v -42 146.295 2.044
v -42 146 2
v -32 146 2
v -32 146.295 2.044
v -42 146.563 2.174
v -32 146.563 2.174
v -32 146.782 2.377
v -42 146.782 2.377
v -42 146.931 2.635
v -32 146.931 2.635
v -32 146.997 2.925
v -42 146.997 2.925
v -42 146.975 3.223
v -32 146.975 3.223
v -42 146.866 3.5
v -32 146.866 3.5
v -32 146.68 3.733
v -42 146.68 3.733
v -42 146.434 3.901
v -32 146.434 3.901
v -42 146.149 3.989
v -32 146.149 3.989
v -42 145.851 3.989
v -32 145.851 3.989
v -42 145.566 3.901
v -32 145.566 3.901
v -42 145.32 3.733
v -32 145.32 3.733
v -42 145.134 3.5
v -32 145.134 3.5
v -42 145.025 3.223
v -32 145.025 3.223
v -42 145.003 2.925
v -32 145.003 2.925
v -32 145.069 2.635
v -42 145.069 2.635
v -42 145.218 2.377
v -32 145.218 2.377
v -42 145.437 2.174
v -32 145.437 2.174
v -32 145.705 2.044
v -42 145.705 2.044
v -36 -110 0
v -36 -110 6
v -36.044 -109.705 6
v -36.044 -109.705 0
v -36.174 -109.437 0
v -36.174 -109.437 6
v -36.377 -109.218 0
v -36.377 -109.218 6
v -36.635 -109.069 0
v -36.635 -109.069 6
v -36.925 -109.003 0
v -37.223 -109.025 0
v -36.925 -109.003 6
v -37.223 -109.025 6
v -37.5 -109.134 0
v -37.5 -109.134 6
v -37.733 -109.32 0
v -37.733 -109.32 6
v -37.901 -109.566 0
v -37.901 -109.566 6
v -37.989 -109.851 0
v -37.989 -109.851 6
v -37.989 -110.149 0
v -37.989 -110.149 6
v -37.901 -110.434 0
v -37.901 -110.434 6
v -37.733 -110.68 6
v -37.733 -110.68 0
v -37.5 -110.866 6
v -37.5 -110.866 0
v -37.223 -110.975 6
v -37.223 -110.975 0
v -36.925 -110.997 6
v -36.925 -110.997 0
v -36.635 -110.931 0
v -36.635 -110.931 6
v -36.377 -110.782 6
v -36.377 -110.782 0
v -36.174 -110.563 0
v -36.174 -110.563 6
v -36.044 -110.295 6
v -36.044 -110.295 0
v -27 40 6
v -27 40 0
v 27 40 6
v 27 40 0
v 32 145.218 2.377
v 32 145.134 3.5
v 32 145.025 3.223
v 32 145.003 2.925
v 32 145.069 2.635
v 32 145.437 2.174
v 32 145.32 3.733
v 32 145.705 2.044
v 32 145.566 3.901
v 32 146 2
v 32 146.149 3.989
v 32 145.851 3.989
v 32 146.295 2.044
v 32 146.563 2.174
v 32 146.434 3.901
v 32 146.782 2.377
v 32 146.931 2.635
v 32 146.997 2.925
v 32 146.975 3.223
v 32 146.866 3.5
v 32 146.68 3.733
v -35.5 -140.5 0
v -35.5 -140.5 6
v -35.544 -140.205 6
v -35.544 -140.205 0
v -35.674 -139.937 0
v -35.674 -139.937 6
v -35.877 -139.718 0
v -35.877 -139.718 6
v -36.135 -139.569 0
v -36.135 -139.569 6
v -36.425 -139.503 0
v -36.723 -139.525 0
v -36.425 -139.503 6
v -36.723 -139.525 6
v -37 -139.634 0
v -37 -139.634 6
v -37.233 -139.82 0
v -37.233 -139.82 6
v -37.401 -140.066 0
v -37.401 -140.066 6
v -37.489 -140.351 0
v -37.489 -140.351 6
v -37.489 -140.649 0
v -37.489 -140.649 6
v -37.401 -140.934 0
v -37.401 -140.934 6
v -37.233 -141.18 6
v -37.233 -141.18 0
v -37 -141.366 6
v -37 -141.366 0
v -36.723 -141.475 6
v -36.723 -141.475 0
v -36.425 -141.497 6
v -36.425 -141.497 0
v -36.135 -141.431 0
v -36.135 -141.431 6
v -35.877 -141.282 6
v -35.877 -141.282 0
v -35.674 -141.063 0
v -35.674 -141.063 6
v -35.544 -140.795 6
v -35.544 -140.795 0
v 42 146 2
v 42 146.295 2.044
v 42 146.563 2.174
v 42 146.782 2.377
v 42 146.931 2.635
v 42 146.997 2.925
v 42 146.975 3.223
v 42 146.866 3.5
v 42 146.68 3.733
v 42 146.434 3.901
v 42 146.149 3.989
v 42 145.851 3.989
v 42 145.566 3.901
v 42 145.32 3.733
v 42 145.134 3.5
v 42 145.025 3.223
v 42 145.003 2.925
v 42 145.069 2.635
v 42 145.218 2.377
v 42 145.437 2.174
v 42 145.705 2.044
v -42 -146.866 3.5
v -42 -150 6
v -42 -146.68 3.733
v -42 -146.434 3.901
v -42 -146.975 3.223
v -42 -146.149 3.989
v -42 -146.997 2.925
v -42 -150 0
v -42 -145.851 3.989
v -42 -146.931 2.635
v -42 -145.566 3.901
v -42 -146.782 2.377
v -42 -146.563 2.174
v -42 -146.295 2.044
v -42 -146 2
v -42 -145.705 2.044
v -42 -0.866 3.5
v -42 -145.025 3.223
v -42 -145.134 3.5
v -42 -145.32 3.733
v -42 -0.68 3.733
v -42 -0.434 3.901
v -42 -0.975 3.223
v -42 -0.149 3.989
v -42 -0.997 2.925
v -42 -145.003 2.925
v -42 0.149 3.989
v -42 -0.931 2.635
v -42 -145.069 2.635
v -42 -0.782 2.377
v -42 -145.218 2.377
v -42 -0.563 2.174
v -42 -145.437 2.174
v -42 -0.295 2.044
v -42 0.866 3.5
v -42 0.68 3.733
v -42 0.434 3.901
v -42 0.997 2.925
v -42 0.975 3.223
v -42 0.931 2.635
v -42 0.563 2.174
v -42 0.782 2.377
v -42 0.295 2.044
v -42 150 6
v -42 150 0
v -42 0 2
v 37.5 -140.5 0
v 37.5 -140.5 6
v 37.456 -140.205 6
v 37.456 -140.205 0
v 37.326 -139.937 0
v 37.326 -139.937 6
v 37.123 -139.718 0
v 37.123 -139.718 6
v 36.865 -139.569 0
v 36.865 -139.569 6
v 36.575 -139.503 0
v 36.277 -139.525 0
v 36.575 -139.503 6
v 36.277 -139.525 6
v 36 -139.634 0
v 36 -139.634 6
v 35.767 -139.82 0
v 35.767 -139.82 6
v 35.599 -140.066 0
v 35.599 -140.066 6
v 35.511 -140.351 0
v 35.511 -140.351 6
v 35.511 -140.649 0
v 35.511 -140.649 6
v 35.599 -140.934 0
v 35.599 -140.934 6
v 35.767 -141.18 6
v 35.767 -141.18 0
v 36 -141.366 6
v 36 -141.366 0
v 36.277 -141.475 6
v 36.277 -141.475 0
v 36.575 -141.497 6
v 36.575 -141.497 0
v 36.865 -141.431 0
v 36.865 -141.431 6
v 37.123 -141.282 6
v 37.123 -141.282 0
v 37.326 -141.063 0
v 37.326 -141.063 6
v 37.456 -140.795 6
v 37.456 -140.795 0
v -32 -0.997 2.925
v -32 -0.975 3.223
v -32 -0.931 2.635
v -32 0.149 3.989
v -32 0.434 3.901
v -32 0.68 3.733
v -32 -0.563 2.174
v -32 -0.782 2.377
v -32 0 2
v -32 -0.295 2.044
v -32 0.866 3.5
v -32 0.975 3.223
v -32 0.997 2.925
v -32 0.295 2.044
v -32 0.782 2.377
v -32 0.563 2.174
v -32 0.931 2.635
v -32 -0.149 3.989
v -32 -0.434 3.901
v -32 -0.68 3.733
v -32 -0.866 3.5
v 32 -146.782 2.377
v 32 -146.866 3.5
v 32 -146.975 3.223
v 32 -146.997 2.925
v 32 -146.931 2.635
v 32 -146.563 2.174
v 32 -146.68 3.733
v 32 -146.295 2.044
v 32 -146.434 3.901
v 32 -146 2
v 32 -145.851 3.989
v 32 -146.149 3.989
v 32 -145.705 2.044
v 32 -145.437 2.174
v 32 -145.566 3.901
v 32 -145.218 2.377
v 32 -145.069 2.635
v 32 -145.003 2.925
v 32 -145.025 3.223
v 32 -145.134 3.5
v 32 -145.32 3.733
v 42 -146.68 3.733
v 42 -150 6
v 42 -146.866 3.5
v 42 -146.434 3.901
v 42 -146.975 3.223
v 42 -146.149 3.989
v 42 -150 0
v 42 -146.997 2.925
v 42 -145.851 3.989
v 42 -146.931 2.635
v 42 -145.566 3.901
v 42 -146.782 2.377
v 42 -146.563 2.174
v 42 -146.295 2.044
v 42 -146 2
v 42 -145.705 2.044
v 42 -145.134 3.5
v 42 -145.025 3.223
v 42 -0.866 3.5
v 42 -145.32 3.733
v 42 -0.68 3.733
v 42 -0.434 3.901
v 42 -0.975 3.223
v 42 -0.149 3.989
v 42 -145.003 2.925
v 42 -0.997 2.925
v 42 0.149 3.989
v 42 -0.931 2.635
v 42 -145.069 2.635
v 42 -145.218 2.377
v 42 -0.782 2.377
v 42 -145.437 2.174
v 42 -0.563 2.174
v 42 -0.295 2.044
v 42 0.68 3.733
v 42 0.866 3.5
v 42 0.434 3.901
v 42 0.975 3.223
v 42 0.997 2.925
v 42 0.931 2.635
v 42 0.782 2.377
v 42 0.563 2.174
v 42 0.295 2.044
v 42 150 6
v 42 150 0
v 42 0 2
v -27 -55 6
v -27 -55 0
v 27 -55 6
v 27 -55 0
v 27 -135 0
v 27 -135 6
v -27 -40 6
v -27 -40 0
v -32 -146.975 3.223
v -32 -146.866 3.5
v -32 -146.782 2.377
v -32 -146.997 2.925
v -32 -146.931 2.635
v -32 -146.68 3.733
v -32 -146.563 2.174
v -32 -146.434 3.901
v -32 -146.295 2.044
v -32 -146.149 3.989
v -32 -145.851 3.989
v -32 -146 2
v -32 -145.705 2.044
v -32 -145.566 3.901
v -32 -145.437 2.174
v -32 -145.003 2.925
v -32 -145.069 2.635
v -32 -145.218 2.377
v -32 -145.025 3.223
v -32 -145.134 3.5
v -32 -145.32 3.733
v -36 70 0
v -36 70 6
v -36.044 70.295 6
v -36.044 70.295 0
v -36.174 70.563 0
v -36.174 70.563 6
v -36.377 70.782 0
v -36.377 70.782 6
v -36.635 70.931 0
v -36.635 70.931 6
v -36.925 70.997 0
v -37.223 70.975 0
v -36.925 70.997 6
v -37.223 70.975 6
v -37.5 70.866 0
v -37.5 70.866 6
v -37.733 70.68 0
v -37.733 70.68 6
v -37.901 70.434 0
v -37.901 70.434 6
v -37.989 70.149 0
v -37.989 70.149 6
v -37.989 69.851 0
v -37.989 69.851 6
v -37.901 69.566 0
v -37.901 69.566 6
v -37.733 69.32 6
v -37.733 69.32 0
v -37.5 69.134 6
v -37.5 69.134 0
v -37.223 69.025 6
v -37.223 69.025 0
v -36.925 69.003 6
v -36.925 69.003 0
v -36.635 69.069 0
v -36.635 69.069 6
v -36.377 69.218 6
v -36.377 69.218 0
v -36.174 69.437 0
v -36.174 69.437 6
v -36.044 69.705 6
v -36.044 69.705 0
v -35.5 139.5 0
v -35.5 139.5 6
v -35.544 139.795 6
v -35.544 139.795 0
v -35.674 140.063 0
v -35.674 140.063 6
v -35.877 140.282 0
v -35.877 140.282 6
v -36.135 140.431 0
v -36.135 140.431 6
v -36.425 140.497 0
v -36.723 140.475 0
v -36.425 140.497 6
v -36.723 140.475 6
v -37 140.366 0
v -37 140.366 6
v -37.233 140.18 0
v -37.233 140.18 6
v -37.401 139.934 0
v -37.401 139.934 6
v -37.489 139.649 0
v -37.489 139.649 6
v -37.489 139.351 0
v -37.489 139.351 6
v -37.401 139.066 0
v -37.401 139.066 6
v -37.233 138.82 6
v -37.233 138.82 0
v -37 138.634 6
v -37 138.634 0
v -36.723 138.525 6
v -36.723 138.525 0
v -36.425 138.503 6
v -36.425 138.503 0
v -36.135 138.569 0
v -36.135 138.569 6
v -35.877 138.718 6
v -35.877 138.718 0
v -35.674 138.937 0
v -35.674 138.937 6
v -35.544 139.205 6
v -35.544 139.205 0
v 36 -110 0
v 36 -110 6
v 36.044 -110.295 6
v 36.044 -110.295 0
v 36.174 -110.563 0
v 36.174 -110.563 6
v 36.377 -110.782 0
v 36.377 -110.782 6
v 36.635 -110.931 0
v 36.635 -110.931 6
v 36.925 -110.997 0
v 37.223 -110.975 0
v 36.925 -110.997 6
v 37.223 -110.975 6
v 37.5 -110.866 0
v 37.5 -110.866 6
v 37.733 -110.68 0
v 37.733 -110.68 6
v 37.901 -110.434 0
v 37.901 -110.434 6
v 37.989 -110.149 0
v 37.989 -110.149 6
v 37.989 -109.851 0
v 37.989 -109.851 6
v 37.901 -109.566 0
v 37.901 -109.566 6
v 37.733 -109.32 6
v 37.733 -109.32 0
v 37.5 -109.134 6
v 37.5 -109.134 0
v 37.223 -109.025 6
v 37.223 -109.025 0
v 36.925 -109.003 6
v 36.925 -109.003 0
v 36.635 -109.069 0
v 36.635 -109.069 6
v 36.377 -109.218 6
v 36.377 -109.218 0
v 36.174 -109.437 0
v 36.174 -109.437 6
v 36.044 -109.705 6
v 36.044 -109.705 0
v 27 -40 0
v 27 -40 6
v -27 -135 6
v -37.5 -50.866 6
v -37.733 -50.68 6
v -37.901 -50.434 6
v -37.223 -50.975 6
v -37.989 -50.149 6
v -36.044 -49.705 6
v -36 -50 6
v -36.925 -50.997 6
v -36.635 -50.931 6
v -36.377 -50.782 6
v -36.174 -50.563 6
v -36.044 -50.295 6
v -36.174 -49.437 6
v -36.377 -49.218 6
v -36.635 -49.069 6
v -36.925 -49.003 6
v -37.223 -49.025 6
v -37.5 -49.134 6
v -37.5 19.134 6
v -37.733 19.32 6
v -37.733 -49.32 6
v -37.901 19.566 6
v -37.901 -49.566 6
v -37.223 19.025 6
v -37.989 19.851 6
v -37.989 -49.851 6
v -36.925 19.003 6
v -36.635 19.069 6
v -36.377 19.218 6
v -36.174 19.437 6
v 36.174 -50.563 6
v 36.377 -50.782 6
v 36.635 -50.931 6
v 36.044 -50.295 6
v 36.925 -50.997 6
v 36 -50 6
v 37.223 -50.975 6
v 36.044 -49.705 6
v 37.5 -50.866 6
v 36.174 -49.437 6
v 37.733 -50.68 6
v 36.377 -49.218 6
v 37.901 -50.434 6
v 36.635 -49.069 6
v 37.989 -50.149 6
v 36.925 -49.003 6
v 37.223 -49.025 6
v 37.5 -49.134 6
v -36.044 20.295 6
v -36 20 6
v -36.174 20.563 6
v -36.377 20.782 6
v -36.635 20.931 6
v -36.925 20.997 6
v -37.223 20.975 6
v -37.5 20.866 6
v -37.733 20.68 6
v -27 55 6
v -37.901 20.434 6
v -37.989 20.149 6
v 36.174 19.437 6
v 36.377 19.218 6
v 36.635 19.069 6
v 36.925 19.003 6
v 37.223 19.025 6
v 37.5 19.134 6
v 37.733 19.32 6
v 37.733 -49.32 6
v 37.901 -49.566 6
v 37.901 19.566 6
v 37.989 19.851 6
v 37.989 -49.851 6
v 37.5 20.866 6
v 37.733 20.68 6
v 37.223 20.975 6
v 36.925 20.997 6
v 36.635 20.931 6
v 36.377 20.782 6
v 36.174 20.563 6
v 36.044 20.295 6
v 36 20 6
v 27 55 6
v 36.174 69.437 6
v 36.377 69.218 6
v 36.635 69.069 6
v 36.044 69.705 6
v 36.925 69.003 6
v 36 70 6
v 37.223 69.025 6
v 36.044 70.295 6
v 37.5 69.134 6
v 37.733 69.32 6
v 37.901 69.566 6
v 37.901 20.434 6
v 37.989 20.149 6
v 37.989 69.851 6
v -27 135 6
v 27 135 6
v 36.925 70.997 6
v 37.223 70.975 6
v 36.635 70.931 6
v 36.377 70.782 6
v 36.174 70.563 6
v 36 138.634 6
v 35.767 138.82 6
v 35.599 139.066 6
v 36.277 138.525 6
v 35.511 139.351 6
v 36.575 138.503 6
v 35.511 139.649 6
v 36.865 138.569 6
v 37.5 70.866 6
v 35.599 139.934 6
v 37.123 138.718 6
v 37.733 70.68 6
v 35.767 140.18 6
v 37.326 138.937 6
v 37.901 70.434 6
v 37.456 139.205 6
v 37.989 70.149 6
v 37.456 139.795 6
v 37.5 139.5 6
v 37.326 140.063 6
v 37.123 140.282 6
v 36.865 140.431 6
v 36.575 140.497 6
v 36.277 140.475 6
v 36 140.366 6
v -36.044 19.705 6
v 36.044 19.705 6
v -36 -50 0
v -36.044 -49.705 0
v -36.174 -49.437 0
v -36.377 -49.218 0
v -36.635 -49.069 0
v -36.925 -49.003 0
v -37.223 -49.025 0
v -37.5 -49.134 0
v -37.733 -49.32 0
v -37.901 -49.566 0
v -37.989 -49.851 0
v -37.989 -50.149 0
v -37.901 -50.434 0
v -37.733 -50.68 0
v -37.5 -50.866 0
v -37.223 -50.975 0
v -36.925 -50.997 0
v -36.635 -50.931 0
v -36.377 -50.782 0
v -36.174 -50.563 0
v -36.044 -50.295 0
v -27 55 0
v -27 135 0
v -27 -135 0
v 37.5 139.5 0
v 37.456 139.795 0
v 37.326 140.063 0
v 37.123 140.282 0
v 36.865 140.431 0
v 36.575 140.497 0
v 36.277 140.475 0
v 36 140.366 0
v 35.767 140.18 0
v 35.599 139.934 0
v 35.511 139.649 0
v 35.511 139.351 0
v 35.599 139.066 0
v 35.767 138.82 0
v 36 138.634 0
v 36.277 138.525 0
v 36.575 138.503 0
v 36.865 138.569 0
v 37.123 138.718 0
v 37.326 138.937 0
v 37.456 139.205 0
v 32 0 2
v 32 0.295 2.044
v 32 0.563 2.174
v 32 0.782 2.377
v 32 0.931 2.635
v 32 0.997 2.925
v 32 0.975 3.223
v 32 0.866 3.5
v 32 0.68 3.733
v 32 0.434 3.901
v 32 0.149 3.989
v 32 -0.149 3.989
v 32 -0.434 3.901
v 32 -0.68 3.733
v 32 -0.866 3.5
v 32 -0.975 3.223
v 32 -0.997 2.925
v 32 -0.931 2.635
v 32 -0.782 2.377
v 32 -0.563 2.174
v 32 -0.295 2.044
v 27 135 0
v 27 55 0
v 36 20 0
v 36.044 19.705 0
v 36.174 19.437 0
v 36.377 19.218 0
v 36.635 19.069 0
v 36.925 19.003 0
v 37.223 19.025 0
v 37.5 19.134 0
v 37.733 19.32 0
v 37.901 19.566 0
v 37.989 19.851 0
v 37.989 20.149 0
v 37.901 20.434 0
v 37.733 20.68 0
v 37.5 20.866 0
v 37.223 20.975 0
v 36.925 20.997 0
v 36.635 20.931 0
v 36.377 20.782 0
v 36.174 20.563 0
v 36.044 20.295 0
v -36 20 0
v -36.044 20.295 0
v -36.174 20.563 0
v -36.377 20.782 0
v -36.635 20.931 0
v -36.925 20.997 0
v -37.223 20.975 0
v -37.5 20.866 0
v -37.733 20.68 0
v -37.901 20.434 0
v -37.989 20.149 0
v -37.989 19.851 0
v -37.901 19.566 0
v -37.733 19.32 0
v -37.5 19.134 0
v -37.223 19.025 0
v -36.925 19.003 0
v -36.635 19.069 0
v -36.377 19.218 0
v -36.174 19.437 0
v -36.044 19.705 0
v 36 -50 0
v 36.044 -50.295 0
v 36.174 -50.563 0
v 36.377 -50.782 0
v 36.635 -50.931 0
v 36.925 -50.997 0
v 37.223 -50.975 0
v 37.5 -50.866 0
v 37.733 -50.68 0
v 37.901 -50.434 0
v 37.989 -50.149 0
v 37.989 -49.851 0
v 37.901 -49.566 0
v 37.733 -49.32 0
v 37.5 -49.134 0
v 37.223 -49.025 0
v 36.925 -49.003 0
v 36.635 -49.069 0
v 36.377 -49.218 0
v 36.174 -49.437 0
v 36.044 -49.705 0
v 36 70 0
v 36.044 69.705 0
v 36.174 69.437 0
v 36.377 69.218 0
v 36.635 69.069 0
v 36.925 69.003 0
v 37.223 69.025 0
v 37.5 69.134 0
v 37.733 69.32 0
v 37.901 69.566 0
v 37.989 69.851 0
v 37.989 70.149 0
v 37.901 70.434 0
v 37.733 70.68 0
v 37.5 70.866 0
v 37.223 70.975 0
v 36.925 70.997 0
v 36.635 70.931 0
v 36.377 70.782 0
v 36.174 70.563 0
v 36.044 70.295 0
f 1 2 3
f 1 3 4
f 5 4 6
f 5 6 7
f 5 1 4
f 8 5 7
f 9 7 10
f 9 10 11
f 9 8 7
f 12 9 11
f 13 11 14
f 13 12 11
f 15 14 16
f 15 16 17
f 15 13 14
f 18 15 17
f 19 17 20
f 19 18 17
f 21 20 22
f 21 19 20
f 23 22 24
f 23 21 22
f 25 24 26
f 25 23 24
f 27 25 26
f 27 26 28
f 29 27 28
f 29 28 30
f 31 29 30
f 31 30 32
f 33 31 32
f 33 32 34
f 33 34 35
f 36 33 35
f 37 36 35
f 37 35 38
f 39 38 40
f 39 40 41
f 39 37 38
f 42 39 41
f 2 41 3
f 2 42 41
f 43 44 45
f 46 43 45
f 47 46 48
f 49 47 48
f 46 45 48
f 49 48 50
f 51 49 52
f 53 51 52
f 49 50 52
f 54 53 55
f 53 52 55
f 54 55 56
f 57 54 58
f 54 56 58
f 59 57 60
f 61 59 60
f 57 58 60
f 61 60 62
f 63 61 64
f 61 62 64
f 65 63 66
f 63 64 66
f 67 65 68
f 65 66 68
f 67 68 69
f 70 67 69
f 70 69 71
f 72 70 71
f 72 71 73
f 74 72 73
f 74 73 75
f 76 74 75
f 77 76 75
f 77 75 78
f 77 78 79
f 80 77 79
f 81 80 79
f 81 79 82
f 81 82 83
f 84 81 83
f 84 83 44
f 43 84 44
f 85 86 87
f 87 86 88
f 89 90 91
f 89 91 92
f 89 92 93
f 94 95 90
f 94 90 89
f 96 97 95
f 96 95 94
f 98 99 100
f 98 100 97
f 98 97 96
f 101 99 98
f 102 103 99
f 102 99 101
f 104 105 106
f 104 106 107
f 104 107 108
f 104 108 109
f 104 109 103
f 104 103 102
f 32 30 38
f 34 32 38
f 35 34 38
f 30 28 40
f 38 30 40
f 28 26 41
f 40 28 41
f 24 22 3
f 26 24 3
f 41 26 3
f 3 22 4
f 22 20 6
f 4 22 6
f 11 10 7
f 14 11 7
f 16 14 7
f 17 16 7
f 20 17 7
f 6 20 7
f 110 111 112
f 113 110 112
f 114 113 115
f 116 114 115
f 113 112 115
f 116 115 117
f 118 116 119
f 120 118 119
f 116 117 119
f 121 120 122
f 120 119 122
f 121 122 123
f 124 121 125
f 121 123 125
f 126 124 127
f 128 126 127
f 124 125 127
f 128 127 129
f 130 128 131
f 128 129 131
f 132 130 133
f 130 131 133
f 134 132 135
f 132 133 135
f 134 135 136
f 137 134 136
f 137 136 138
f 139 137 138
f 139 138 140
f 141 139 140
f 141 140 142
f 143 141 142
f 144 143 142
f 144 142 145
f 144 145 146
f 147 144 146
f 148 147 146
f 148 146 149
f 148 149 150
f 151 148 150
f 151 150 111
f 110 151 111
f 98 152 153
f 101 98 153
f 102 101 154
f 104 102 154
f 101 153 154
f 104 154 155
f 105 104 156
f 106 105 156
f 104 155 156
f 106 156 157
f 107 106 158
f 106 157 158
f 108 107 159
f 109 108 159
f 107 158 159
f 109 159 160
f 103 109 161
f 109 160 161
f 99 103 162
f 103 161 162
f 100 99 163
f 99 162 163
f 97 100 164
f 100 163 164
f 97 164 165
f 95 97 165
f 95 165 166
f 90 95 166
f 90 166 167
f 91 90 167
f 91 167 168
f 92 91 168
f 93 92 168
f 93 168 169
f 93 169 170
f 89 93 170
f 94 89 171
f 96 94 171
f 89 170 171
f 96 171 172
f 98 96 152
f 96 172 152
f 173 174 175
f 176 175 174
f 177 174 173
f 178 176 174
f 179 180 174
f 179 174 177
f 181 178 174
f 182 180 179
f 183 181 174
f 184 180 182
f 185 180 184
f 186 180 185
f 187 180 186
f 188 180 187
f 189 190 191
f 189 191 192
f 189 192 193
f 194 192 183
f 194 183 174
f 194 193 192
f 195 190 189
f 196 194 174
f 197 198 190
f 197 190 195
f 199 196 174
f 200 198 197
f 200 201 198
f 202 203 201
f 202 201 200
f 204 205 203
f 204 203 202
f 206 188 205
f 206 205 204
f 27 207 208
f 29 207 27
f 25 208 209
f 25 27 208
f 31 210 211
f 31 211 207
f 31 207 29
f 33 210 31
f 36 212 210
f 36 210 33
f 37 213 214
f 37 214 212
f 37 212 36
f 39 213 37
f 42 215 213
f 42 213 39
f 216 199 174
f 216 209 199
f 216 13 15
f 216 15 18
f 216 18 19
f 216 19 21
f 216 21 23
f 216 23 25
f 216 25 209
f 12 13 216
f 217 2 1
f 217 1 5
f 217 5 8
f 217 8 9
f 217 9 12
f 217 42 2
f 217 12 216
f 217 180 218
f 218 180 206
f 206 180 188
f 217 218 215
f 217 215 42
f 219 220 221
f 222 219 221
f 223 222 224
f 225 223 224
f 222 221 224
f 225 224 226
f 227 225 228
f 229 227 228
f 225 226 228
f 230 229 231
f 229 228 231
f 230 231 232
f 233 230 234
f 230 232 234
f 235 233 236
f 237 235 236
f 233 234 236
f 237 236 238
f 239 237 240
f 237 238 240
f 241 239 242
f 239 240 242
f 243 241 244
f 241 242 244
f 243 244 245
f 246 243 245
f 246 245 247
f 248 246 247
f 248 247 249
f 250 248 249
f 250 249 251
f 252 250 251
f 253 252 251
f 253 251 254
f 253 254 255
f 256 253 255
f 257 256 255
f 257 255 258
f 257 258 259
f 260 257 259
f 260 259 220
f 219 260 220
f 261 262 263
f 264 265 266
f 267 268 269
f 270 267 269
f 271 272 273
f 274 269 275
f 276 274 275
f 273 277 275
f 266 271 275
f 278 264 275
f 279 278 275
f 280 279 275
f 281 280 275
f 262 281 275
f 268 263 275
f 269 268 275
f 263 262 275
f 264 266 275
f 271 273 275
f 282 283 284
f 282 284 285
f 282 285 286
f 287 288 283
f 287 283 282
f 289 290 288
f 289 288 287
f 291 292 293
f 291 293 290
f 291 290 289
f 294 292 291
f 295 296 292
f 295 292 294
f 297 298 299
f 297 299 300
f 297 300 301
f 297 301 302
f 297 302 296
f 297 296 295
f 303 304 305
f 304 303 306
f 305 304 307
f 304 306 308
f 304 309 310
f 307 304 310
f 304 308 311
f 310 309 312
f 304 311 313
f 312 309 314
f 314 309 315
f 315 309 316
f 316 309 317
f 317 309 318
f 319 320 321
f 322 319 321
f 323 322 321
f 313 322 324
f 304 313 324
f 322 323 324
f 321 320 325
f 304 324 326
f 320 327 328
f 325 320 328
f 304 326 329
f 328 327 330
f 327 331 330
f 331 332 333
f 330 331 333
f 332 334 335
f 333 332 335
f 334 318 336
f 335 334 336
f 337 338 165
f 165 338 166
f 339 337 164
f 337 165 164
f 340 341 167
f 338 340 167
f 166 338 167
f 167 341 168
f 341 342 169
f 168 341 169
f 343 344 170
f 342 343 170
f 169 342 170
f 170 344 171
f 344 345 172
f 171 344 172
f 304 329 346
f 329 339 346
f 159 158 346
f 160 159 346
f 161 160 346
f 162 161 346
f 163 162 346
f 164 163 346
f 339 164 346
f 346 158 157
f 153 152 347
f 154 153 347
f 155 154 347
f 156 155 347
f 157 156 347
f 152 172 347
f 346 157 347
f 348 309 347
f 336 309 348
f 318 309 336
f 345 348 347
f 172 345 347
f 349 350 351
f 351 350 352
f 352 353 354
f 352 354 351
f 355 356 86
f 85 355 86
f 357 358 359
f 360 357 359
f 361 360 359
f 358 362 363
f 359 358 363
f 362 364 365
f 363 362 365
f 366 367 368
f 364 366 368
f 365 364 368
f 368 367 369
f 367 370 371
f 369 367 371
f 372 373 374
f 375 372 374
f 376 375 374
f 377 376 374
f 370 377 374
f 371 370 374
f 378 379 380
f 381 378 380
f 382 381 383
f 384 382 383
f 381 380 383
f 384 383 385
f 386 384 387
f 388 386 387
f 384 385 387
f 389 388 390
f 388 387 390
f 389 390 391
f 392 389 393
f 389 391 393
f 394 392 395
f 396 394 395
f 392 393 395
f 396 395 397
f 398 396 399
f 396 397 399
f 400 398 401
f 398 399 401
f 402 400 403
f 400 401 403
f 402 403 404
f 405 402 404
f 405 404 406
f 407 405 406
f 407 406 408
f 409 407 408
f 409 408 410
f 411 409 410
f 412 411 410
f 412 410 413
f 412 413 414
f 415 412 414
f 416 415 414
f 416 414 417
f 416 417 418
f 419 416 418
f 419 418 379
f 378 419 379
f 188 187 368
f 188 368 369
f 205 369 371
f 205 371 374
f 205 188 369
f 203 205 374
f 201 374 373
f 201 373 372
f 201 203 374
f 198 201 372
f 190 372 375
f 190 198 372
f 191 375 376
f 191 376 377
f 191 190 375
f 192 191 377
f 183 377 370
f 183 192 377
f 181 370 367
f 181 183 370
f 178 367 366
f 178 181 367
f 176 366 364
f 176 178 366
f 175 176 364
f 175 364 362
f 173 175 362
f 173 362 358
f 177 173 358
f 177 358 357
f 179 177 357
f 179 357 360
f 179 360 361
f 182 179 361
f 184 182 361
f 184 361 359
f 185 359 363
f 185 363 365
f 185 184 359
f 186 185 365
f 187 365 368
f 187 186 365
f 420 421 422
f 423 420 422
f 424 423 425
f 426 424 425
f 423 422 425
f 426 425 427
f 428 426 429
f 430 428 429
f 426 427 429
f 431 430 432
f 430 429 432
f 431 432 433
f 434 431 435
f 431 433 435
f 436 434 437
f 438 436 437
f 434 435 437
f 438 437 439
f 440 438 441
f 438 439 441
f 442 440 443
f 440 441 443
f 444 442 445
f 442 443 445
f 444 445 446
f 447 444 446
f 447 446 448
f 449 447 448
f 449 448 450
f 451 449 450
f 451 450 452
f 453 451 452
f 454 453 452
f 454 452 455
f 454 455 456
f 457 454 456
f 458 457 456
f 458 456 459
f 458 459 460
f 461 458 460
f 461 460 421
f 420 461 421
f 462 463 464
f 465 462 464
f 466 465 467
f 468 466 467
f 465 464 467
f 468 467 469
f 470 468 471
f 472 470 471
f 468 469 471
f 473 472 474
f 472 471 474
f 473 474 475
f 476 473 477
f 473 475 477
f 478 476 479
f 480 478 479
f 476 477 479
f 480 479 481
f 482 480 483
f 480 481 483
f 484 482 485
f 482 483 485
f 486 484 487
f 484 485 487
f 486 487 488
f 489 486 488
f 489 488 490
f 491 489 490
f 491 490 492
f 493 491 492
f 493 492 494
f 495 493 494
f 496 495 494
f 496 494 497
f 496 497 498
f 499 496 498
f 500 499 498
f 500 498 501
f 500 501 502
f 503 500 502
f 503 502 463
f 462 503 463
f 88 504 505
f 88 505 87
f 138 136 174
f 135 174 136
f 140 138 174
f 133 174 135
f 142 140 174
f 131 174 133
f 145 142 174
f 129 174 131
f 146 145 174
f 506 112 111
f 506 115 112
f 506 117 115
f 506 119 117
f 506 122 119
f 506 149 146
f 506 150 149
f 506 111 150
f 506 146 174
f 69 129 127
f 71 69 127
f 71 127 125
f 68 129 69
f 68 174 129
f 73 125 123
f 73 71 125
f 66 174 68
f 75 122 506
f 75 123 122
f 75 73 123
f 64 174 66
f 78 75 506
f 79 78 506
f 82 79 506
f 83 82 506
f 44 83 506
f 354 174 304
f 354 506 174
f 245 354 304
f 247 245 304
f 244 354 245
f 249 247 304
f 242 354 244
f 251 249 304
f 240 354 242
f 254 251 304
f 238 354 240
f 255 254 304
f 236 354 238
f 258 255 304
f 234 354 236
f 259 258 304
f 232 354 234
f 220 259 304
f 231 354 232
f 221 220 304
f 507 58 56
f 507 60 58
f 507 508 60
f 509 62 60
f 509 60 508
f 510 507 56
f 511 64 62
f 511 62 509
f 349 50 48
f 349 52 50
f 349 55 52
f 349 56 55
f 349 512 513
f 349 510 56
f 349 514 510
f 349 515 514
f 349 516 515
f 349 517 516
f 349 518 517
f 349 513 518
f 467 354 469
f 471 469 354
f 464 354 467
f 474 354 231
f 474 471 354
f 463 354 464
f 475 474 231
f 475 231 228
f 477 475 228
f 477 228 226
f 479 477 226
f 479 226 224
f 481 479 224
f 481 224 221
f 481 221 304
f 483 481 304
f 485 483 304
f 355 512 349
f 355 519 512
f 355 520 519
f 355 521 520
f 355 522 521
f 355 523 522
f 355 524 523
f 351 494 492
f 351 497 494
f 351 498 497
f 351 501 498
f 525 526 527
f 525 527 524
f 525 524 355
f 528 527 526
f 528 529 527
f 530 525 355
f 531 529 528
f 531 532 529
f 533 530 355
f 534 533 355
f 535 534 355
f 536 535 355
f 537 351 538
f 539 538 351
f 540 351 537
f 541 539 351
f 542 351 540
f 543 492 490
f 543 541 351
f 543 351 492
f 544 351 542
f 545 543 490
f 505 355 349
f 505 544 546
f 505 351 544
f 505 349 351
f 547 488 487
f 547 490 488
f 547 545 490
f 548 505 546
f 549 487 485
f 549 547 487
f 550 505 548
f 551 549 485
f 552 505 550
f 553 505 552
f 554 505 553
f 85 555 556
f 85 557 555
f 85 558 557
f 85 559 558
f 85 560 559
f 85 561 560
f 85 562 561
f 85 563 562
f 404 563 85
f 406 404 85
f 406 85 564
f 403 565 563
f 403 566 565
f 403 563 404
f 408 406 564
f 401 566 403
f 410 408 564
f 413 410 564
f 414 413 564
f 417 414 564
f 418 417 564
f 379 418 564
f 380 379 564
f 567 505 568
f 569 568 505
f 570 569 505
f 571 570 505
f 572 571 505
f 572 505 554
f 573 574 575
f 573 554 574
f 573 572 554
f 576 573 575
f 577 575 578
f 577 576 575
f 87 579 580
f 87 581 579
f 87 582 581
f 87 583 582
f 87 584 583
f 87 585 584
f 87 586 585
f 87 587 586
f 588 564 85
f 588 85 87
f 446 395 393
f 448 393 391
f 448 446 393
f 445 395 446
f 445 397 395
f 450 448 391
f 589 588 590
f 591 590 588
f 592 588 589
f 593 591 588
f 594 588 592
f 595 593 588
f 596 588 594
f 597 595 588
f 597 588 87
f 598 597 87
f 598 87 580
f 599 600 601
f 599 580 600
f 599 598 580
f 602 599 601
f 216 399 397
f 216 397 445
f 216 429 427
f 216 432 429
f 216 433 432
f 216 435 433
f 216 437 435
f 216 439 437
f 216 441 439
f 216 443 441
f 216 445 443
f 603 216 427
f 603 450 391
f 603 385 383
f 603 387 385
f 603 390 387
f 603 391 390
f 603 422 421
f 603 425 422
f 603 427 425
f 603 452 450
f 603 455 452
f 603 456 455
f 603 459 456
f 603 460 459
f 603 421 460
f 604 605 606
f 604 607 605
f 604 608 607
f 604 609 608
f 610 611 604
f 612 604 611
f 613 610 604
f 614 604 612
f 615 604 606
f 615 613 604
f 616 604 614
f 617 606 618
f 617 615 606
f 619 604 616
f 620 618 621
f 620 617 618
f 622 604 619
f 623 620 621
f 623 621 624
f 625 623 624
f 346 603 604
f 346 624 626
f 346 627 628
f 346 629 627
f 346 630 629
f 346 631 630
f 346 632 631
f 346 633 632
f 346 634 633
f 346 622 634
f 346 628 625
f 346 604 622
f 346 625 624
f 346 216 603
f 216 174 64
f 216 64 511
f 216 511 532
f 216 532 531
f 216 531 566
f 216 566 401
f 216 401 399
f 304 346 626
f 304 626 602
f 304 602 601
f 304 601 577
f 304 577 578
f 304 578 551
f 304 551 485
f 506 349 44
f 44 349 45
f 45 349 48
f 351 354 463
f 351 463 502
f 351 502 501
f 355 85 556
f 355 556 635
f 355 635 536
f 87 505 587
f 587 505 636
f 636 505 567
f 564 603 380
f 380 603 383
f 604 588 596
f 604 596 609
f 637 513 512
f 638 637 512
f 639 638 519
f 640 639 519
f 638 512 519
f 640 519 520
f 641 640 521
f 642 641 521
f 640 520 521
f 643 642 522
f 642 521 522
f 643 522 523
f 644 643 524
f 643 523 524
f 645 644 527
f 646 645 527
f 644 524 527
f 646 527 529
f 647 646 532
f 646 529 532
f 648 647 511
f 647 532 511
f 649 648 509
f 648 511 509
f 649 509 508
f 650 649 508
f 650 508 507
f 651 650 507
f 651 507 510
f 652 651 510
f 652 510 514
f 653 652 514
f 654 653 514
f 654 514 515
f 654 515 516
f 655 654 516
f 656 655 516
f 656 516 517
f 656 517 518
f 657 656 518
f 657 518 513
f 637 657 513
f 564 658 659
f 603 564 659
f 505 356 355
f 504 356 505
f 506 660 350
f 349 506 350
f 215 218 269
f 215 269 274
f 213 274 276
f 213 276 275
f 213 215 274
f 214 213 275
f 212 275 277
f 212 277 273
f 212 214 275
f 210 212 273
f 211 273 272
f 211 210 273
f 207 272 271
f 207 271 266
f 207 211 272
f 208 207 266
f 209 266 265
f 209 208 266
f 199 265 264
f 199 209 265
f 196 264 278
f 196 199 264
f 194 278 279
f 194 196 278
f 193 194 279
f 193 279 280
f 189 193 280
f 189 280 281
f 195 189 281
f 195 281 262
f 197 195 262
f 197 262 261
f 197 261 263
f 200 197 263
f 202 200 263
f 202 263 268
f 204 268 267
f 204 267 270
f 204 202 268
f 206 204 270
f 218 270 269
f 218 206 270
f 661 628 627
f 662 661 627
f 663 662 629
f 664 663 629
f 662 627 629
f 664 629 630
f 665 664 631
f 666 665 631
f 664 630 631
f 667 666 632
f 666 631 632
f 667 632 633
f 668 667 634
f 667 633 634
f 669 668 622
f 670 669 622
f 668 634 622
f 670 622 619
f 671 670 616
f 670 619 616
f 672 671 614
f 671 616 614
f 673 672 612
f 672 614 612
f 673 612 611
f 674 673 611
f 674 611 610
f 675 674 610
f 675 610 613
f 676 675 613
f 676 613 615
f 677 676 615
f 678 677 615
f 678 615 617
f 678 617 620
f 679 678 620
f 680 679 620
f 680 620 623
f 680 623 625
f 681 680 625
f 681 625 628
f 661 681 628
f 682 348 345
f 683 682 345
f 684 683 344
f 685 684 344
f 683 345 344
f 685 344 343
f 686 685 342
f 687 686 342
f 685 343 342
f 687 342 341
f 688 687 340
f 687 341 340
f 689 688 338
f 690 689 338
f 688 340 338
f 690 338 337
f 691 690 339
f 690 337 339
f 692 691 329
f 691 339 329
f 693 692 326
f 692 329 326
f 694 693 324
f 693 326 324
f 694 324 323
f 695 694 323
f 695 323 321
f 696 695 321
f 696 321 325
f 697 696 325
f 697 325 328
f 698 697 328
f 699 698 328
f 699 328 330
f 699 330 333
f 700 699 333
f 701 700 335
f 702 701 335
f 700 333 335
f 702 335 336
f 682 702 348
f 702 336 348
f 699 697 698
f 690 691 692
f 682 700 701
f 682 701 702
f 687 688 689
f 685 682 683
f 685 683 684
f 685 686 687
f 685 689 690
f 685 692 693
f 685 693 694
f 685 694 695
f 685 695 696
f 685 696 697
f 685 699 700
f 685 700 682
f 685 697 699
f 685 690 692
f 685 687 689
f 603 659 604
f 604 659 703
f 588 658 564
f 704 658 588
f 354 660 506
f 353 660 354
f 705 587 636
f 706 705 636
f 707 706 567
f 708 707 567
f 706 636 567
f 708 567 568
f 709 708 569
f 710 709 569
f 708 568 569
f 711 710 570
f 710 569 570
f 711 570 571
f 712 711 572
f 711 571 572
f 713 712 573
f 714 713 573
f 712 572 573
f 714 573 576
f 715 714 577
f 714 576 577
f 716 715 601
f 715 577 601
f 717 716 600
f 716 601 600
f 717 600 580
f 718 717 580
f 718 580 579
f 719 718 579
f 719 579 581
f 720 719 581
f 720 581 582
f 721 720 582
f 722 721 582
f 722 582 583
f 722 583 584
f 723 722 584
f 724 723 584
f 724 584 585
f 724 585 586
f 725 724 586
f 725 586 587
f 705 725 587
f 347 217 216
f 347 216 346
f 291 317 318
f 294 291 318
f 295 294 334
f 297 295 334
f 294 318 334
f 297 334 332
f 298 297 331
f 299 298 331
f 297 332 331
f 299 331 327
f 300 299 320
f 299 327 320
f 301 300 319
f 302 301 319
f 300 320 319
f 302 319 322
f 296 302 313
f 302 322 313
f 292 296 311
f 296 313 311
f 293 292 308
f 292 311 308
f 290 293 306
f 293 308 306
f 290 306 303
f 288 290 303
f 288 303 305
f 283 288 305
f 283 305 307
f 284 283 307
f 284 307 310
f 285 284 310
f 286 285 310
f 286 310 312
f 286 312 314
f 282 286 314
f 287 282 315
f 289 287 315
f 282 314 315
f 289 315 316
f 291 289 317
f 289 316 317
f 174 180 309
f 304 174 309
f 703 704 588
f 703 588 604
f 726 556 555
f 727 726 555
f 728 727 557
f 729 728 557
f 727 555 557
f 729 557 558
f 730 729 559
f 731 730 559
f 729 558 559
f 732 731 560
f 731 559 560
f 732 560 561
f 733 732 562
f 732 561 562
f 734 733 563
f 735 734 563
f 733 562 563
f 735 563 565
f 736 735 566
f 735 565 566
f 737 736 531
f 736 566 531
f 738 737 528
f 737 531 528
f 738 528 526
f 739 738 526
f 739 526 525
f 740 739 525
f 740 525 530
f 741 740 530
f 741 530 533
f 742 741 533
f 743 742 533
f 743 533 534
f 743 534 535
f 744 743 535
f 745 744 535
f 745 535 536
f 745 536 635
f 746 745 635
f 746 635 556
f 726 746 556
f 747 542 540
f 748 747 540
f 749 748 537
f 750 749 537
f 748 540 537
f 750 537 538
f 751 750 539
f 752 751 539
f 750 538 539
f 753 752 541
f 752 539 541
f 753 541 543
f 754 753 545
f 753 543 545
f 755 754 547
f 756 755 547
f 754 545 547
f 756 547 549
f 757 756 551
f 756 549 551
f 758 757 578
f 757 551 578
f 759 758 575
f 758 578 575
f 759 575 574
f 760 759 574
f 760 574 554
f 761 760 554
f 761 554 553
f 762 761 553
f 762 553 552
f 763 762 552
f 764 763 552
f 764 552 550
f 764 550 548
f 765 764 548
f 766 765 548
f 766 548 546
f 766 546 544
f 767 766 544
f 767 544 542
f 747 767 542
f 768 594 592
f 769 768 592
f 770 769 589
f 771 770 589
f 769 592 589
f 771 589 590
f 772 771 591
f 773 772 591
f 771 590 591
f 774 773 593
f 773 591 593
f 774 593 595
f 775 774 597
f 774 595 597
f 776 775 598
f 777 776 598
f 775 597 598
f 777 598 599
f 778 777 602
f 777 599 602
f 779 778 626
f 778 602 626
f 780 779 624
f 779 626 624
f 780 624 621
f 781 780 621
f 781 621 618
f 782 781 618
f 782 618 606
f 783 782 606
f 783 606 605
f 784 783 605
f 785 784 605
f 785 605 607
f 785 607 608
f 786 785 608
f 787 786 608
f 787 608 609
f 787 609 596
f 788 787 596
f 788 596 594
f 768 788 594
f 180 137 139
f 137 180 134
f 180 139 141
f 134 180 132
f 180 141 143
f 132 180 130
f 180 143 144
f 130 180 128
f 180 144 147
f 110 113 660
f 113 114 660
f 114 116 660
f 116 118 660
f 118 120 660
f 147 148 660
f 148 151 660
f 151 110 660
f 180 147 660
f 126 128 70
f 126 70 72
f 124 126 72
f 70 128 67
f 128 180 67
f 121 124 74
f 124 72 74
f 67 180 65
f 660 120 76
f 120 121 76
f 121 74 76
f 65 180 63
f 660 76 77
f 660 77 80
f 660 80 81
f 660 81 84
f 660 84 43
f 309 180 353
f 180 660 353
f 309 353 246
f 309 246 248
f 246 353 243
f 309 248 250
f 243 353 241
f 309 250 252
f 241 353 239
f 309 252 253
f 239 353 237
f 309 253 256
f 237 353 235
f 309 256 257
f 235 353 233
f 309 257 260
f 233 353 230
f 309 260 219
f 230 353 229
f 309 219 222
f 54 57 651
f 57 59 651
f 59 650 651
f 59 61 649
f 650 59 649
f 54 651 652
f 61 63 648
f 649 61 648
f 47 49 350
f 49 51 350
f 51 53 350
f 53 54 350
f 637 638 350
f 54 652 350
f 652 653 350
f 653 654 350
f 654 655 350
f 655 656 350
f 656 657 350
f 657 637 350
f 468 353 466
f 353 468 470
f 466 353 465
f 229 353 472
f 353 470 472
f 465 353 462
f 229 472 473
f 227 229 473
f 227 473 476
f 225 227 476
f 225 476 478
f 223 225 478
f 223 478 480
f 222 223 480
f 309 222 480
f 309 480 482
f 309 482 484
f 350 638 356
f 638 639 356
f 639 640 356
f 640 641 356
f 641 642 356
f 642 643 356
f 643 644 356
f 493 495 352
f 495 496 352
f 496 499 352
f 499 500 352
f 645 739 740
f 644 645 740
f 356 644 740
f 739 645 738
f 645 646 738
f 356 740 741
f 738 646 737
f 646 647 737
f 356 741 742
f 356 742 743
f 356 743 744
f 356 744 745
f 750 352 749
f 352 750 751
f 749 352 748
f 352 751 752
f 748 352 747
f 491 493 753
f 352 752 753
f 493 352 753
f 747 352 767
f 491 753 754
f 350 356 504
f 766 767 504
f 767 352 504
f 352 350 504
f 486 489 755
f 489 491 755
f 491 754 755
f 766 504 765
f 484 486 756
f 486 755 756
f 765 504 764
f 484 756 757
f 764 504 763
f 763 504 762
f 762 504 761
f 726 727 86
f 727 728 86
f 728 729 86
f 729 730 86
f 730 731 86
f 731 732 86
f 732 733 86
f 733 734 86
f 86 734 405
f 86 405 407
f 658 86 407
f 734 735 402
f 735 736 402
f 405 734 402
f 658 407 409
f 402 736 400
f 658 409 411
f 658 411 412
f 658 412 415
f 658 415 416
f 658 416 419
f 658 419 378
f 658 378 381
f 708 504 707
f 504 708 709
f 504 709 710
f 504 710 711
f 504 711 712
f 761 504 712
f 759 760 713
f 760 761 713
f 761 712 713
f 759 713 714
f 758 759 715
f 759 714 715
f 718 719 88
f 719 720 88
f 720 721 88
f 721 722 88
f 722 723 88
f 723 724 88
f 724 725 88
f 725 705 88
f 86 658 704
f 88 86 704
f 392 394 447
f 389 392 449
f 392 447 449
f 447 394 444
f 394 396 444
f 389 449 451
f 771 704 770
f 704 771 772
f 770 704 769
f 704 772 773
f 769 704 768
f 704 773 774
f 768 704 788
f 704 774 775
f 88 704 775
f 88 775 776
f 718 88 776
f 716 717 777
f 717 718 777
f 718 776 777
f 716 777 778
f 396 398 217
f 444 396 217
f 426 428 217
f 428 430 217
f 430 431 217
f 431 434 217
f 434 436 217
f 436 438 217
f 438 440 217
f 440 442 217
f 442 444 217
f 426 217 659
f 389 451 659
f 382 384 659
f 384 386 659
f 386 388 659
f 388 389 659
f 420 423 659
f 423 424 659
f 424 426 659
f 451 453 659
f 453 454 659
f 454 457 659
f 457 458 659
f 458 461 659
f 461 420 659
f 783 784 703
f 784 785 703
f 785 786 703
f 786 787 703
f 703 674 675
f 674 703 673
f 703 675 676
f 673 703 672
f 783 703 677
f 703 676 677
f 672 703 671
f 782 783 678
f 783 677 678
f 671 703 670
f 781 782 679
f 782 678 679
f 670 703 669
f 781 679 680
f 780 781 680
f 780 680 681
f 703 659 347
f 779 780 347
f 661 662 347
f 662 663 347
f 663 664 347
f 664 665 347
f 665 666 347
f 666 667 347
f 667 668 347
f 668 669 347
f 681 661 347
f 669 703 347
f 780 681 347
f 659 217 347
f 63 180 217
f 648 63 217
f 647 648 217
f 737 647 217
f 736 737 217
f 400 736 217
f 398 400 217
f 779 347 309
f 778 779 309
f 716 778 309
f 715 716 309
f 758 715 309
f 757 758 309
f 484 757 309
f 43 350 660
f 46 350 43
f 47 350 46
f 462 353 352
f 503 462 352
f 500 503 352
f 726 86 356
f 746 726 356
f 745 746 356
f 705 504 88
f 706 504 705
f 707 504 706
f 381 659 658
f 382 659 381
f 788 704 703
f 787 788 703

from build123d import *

# Parameters (mm, degrees)
SKETCH1_W           = 84
SKETCH1_H           = 300
SKETCH1_W_2         = 54
SKETCH1_H_2         = 80
BOSS_EXTRUDE1_DEPTH = 6
SKETCH2_R           = 1
CUT_EXTRUDE1_DEPTH  = 10
SKETCH4_R           = 1
CUT_EXTRUDE3_DEPTH  = 10
SKETCH5_R           = 1
CUT_EXTRUDE4_DEPTH  = 10


with BuildPart() as part:
    # Sketch1 → Boss-Extrude1 (new body)
    with BuildSketch(Plane.XY):
        Rectangle(SKETCH1_W, SKETCH1_H)
        with Locations((0, 95)):
            Rectangle(SKETCH1_W_2, SKETCH1_H_2, mode=Mode.SUBTRACT)
        with Locations((0, -95)):
            Rectangle(SKETCH1_W_2, SKETCH1_H_2, mode=Mode.SUBTRACT)
        Rectangle(SKETCH1_W_2, SKETCH1_H_2, mode=Mode.SUBTRACT)
    extrude(amount=BOSS_EXTRUDE1_DEPTH)

    # Sketch2 → Cut-Extrude1 (cut)
    with BuildSketch(Plane(origin=(42, 0, 0), x_dir=(0, 0, -1), z_dir=(1, 0, 0))):
        with Locations((-3, 146)):
            Circle(SKETCH2_R)
        with Locations((-3, 0)):
            Circle(SKETCH2_R)
        with Locations((-3, -146)):
            Circle(SKETCH2_R)
        with Locations((-3, -292)):
            Circle(SKETCH2_R)
    cut_extrude1 = extrude(amount=-CUT_EXTRUDE1_DEPTH, mode=Mode.SUBTRACT)

    # Mirror1: Cut-Extrude1 across plane
    add(cut_extrude1.mirror(Plane(origin=(0, 0, 0), x_dir=(0, 0, 1), z_dir=(1, 0, 0))), mode=Mode.SUBTRACT)

    # Sketch4 → Cut-Extrude3 (cut)
    with BuildSketch(Plane.XY.offset(6)):
        with Locations((-37, 70)):
            Circle(SKETCH4_R)
        with Locations((-37, 20)):
            Circle(SKETCH4_R)
        with Locations((-37, -50)):
            Circle(SKETCH4_R)
        with Locations((-37, -110)):
            Circle(SKETCH4_R)
        with Locations(Location((37, -110, 0), (0, 0, 180))):
            Circle(SKETCH4_R)
        with Locations(Location((37, -50, 0), (0, 0, 180))):
            Circle(SKETCH4_R)
        with Locations(Location((37, 20, 0), (0, 0, 180))):
            Circle(SKETCH4_R)
        with Locations(Location((37, 70, 0), (0, 0, 180))):
            Circle(SKETCH4_R)
    extrude(amount=-CUT_EXTRUDE3_DEPTH, mode=Mode.SUBTRACT)

    # Sketch5 → Cut-Extrude4 (cut)
    with BuildSketch(Plane.XY.offset(6)):
        with Locations((-36.5, -140.5)):
            Circle(SKETCH5_R)
        with Locations((36.5, -140.5)):
            Circle(SKETCH5_R)
        with Locations((-36.5, 139.5)):
            Circle(SKETCH5_R)
        with Locations((36.5, 139.5)):
            Circle(SKETCH5_R)
    extrude(amount=-CUT_EXTRUDE4_DEPTH, mode=Mode.SUBTRACT)


solid = part.part
